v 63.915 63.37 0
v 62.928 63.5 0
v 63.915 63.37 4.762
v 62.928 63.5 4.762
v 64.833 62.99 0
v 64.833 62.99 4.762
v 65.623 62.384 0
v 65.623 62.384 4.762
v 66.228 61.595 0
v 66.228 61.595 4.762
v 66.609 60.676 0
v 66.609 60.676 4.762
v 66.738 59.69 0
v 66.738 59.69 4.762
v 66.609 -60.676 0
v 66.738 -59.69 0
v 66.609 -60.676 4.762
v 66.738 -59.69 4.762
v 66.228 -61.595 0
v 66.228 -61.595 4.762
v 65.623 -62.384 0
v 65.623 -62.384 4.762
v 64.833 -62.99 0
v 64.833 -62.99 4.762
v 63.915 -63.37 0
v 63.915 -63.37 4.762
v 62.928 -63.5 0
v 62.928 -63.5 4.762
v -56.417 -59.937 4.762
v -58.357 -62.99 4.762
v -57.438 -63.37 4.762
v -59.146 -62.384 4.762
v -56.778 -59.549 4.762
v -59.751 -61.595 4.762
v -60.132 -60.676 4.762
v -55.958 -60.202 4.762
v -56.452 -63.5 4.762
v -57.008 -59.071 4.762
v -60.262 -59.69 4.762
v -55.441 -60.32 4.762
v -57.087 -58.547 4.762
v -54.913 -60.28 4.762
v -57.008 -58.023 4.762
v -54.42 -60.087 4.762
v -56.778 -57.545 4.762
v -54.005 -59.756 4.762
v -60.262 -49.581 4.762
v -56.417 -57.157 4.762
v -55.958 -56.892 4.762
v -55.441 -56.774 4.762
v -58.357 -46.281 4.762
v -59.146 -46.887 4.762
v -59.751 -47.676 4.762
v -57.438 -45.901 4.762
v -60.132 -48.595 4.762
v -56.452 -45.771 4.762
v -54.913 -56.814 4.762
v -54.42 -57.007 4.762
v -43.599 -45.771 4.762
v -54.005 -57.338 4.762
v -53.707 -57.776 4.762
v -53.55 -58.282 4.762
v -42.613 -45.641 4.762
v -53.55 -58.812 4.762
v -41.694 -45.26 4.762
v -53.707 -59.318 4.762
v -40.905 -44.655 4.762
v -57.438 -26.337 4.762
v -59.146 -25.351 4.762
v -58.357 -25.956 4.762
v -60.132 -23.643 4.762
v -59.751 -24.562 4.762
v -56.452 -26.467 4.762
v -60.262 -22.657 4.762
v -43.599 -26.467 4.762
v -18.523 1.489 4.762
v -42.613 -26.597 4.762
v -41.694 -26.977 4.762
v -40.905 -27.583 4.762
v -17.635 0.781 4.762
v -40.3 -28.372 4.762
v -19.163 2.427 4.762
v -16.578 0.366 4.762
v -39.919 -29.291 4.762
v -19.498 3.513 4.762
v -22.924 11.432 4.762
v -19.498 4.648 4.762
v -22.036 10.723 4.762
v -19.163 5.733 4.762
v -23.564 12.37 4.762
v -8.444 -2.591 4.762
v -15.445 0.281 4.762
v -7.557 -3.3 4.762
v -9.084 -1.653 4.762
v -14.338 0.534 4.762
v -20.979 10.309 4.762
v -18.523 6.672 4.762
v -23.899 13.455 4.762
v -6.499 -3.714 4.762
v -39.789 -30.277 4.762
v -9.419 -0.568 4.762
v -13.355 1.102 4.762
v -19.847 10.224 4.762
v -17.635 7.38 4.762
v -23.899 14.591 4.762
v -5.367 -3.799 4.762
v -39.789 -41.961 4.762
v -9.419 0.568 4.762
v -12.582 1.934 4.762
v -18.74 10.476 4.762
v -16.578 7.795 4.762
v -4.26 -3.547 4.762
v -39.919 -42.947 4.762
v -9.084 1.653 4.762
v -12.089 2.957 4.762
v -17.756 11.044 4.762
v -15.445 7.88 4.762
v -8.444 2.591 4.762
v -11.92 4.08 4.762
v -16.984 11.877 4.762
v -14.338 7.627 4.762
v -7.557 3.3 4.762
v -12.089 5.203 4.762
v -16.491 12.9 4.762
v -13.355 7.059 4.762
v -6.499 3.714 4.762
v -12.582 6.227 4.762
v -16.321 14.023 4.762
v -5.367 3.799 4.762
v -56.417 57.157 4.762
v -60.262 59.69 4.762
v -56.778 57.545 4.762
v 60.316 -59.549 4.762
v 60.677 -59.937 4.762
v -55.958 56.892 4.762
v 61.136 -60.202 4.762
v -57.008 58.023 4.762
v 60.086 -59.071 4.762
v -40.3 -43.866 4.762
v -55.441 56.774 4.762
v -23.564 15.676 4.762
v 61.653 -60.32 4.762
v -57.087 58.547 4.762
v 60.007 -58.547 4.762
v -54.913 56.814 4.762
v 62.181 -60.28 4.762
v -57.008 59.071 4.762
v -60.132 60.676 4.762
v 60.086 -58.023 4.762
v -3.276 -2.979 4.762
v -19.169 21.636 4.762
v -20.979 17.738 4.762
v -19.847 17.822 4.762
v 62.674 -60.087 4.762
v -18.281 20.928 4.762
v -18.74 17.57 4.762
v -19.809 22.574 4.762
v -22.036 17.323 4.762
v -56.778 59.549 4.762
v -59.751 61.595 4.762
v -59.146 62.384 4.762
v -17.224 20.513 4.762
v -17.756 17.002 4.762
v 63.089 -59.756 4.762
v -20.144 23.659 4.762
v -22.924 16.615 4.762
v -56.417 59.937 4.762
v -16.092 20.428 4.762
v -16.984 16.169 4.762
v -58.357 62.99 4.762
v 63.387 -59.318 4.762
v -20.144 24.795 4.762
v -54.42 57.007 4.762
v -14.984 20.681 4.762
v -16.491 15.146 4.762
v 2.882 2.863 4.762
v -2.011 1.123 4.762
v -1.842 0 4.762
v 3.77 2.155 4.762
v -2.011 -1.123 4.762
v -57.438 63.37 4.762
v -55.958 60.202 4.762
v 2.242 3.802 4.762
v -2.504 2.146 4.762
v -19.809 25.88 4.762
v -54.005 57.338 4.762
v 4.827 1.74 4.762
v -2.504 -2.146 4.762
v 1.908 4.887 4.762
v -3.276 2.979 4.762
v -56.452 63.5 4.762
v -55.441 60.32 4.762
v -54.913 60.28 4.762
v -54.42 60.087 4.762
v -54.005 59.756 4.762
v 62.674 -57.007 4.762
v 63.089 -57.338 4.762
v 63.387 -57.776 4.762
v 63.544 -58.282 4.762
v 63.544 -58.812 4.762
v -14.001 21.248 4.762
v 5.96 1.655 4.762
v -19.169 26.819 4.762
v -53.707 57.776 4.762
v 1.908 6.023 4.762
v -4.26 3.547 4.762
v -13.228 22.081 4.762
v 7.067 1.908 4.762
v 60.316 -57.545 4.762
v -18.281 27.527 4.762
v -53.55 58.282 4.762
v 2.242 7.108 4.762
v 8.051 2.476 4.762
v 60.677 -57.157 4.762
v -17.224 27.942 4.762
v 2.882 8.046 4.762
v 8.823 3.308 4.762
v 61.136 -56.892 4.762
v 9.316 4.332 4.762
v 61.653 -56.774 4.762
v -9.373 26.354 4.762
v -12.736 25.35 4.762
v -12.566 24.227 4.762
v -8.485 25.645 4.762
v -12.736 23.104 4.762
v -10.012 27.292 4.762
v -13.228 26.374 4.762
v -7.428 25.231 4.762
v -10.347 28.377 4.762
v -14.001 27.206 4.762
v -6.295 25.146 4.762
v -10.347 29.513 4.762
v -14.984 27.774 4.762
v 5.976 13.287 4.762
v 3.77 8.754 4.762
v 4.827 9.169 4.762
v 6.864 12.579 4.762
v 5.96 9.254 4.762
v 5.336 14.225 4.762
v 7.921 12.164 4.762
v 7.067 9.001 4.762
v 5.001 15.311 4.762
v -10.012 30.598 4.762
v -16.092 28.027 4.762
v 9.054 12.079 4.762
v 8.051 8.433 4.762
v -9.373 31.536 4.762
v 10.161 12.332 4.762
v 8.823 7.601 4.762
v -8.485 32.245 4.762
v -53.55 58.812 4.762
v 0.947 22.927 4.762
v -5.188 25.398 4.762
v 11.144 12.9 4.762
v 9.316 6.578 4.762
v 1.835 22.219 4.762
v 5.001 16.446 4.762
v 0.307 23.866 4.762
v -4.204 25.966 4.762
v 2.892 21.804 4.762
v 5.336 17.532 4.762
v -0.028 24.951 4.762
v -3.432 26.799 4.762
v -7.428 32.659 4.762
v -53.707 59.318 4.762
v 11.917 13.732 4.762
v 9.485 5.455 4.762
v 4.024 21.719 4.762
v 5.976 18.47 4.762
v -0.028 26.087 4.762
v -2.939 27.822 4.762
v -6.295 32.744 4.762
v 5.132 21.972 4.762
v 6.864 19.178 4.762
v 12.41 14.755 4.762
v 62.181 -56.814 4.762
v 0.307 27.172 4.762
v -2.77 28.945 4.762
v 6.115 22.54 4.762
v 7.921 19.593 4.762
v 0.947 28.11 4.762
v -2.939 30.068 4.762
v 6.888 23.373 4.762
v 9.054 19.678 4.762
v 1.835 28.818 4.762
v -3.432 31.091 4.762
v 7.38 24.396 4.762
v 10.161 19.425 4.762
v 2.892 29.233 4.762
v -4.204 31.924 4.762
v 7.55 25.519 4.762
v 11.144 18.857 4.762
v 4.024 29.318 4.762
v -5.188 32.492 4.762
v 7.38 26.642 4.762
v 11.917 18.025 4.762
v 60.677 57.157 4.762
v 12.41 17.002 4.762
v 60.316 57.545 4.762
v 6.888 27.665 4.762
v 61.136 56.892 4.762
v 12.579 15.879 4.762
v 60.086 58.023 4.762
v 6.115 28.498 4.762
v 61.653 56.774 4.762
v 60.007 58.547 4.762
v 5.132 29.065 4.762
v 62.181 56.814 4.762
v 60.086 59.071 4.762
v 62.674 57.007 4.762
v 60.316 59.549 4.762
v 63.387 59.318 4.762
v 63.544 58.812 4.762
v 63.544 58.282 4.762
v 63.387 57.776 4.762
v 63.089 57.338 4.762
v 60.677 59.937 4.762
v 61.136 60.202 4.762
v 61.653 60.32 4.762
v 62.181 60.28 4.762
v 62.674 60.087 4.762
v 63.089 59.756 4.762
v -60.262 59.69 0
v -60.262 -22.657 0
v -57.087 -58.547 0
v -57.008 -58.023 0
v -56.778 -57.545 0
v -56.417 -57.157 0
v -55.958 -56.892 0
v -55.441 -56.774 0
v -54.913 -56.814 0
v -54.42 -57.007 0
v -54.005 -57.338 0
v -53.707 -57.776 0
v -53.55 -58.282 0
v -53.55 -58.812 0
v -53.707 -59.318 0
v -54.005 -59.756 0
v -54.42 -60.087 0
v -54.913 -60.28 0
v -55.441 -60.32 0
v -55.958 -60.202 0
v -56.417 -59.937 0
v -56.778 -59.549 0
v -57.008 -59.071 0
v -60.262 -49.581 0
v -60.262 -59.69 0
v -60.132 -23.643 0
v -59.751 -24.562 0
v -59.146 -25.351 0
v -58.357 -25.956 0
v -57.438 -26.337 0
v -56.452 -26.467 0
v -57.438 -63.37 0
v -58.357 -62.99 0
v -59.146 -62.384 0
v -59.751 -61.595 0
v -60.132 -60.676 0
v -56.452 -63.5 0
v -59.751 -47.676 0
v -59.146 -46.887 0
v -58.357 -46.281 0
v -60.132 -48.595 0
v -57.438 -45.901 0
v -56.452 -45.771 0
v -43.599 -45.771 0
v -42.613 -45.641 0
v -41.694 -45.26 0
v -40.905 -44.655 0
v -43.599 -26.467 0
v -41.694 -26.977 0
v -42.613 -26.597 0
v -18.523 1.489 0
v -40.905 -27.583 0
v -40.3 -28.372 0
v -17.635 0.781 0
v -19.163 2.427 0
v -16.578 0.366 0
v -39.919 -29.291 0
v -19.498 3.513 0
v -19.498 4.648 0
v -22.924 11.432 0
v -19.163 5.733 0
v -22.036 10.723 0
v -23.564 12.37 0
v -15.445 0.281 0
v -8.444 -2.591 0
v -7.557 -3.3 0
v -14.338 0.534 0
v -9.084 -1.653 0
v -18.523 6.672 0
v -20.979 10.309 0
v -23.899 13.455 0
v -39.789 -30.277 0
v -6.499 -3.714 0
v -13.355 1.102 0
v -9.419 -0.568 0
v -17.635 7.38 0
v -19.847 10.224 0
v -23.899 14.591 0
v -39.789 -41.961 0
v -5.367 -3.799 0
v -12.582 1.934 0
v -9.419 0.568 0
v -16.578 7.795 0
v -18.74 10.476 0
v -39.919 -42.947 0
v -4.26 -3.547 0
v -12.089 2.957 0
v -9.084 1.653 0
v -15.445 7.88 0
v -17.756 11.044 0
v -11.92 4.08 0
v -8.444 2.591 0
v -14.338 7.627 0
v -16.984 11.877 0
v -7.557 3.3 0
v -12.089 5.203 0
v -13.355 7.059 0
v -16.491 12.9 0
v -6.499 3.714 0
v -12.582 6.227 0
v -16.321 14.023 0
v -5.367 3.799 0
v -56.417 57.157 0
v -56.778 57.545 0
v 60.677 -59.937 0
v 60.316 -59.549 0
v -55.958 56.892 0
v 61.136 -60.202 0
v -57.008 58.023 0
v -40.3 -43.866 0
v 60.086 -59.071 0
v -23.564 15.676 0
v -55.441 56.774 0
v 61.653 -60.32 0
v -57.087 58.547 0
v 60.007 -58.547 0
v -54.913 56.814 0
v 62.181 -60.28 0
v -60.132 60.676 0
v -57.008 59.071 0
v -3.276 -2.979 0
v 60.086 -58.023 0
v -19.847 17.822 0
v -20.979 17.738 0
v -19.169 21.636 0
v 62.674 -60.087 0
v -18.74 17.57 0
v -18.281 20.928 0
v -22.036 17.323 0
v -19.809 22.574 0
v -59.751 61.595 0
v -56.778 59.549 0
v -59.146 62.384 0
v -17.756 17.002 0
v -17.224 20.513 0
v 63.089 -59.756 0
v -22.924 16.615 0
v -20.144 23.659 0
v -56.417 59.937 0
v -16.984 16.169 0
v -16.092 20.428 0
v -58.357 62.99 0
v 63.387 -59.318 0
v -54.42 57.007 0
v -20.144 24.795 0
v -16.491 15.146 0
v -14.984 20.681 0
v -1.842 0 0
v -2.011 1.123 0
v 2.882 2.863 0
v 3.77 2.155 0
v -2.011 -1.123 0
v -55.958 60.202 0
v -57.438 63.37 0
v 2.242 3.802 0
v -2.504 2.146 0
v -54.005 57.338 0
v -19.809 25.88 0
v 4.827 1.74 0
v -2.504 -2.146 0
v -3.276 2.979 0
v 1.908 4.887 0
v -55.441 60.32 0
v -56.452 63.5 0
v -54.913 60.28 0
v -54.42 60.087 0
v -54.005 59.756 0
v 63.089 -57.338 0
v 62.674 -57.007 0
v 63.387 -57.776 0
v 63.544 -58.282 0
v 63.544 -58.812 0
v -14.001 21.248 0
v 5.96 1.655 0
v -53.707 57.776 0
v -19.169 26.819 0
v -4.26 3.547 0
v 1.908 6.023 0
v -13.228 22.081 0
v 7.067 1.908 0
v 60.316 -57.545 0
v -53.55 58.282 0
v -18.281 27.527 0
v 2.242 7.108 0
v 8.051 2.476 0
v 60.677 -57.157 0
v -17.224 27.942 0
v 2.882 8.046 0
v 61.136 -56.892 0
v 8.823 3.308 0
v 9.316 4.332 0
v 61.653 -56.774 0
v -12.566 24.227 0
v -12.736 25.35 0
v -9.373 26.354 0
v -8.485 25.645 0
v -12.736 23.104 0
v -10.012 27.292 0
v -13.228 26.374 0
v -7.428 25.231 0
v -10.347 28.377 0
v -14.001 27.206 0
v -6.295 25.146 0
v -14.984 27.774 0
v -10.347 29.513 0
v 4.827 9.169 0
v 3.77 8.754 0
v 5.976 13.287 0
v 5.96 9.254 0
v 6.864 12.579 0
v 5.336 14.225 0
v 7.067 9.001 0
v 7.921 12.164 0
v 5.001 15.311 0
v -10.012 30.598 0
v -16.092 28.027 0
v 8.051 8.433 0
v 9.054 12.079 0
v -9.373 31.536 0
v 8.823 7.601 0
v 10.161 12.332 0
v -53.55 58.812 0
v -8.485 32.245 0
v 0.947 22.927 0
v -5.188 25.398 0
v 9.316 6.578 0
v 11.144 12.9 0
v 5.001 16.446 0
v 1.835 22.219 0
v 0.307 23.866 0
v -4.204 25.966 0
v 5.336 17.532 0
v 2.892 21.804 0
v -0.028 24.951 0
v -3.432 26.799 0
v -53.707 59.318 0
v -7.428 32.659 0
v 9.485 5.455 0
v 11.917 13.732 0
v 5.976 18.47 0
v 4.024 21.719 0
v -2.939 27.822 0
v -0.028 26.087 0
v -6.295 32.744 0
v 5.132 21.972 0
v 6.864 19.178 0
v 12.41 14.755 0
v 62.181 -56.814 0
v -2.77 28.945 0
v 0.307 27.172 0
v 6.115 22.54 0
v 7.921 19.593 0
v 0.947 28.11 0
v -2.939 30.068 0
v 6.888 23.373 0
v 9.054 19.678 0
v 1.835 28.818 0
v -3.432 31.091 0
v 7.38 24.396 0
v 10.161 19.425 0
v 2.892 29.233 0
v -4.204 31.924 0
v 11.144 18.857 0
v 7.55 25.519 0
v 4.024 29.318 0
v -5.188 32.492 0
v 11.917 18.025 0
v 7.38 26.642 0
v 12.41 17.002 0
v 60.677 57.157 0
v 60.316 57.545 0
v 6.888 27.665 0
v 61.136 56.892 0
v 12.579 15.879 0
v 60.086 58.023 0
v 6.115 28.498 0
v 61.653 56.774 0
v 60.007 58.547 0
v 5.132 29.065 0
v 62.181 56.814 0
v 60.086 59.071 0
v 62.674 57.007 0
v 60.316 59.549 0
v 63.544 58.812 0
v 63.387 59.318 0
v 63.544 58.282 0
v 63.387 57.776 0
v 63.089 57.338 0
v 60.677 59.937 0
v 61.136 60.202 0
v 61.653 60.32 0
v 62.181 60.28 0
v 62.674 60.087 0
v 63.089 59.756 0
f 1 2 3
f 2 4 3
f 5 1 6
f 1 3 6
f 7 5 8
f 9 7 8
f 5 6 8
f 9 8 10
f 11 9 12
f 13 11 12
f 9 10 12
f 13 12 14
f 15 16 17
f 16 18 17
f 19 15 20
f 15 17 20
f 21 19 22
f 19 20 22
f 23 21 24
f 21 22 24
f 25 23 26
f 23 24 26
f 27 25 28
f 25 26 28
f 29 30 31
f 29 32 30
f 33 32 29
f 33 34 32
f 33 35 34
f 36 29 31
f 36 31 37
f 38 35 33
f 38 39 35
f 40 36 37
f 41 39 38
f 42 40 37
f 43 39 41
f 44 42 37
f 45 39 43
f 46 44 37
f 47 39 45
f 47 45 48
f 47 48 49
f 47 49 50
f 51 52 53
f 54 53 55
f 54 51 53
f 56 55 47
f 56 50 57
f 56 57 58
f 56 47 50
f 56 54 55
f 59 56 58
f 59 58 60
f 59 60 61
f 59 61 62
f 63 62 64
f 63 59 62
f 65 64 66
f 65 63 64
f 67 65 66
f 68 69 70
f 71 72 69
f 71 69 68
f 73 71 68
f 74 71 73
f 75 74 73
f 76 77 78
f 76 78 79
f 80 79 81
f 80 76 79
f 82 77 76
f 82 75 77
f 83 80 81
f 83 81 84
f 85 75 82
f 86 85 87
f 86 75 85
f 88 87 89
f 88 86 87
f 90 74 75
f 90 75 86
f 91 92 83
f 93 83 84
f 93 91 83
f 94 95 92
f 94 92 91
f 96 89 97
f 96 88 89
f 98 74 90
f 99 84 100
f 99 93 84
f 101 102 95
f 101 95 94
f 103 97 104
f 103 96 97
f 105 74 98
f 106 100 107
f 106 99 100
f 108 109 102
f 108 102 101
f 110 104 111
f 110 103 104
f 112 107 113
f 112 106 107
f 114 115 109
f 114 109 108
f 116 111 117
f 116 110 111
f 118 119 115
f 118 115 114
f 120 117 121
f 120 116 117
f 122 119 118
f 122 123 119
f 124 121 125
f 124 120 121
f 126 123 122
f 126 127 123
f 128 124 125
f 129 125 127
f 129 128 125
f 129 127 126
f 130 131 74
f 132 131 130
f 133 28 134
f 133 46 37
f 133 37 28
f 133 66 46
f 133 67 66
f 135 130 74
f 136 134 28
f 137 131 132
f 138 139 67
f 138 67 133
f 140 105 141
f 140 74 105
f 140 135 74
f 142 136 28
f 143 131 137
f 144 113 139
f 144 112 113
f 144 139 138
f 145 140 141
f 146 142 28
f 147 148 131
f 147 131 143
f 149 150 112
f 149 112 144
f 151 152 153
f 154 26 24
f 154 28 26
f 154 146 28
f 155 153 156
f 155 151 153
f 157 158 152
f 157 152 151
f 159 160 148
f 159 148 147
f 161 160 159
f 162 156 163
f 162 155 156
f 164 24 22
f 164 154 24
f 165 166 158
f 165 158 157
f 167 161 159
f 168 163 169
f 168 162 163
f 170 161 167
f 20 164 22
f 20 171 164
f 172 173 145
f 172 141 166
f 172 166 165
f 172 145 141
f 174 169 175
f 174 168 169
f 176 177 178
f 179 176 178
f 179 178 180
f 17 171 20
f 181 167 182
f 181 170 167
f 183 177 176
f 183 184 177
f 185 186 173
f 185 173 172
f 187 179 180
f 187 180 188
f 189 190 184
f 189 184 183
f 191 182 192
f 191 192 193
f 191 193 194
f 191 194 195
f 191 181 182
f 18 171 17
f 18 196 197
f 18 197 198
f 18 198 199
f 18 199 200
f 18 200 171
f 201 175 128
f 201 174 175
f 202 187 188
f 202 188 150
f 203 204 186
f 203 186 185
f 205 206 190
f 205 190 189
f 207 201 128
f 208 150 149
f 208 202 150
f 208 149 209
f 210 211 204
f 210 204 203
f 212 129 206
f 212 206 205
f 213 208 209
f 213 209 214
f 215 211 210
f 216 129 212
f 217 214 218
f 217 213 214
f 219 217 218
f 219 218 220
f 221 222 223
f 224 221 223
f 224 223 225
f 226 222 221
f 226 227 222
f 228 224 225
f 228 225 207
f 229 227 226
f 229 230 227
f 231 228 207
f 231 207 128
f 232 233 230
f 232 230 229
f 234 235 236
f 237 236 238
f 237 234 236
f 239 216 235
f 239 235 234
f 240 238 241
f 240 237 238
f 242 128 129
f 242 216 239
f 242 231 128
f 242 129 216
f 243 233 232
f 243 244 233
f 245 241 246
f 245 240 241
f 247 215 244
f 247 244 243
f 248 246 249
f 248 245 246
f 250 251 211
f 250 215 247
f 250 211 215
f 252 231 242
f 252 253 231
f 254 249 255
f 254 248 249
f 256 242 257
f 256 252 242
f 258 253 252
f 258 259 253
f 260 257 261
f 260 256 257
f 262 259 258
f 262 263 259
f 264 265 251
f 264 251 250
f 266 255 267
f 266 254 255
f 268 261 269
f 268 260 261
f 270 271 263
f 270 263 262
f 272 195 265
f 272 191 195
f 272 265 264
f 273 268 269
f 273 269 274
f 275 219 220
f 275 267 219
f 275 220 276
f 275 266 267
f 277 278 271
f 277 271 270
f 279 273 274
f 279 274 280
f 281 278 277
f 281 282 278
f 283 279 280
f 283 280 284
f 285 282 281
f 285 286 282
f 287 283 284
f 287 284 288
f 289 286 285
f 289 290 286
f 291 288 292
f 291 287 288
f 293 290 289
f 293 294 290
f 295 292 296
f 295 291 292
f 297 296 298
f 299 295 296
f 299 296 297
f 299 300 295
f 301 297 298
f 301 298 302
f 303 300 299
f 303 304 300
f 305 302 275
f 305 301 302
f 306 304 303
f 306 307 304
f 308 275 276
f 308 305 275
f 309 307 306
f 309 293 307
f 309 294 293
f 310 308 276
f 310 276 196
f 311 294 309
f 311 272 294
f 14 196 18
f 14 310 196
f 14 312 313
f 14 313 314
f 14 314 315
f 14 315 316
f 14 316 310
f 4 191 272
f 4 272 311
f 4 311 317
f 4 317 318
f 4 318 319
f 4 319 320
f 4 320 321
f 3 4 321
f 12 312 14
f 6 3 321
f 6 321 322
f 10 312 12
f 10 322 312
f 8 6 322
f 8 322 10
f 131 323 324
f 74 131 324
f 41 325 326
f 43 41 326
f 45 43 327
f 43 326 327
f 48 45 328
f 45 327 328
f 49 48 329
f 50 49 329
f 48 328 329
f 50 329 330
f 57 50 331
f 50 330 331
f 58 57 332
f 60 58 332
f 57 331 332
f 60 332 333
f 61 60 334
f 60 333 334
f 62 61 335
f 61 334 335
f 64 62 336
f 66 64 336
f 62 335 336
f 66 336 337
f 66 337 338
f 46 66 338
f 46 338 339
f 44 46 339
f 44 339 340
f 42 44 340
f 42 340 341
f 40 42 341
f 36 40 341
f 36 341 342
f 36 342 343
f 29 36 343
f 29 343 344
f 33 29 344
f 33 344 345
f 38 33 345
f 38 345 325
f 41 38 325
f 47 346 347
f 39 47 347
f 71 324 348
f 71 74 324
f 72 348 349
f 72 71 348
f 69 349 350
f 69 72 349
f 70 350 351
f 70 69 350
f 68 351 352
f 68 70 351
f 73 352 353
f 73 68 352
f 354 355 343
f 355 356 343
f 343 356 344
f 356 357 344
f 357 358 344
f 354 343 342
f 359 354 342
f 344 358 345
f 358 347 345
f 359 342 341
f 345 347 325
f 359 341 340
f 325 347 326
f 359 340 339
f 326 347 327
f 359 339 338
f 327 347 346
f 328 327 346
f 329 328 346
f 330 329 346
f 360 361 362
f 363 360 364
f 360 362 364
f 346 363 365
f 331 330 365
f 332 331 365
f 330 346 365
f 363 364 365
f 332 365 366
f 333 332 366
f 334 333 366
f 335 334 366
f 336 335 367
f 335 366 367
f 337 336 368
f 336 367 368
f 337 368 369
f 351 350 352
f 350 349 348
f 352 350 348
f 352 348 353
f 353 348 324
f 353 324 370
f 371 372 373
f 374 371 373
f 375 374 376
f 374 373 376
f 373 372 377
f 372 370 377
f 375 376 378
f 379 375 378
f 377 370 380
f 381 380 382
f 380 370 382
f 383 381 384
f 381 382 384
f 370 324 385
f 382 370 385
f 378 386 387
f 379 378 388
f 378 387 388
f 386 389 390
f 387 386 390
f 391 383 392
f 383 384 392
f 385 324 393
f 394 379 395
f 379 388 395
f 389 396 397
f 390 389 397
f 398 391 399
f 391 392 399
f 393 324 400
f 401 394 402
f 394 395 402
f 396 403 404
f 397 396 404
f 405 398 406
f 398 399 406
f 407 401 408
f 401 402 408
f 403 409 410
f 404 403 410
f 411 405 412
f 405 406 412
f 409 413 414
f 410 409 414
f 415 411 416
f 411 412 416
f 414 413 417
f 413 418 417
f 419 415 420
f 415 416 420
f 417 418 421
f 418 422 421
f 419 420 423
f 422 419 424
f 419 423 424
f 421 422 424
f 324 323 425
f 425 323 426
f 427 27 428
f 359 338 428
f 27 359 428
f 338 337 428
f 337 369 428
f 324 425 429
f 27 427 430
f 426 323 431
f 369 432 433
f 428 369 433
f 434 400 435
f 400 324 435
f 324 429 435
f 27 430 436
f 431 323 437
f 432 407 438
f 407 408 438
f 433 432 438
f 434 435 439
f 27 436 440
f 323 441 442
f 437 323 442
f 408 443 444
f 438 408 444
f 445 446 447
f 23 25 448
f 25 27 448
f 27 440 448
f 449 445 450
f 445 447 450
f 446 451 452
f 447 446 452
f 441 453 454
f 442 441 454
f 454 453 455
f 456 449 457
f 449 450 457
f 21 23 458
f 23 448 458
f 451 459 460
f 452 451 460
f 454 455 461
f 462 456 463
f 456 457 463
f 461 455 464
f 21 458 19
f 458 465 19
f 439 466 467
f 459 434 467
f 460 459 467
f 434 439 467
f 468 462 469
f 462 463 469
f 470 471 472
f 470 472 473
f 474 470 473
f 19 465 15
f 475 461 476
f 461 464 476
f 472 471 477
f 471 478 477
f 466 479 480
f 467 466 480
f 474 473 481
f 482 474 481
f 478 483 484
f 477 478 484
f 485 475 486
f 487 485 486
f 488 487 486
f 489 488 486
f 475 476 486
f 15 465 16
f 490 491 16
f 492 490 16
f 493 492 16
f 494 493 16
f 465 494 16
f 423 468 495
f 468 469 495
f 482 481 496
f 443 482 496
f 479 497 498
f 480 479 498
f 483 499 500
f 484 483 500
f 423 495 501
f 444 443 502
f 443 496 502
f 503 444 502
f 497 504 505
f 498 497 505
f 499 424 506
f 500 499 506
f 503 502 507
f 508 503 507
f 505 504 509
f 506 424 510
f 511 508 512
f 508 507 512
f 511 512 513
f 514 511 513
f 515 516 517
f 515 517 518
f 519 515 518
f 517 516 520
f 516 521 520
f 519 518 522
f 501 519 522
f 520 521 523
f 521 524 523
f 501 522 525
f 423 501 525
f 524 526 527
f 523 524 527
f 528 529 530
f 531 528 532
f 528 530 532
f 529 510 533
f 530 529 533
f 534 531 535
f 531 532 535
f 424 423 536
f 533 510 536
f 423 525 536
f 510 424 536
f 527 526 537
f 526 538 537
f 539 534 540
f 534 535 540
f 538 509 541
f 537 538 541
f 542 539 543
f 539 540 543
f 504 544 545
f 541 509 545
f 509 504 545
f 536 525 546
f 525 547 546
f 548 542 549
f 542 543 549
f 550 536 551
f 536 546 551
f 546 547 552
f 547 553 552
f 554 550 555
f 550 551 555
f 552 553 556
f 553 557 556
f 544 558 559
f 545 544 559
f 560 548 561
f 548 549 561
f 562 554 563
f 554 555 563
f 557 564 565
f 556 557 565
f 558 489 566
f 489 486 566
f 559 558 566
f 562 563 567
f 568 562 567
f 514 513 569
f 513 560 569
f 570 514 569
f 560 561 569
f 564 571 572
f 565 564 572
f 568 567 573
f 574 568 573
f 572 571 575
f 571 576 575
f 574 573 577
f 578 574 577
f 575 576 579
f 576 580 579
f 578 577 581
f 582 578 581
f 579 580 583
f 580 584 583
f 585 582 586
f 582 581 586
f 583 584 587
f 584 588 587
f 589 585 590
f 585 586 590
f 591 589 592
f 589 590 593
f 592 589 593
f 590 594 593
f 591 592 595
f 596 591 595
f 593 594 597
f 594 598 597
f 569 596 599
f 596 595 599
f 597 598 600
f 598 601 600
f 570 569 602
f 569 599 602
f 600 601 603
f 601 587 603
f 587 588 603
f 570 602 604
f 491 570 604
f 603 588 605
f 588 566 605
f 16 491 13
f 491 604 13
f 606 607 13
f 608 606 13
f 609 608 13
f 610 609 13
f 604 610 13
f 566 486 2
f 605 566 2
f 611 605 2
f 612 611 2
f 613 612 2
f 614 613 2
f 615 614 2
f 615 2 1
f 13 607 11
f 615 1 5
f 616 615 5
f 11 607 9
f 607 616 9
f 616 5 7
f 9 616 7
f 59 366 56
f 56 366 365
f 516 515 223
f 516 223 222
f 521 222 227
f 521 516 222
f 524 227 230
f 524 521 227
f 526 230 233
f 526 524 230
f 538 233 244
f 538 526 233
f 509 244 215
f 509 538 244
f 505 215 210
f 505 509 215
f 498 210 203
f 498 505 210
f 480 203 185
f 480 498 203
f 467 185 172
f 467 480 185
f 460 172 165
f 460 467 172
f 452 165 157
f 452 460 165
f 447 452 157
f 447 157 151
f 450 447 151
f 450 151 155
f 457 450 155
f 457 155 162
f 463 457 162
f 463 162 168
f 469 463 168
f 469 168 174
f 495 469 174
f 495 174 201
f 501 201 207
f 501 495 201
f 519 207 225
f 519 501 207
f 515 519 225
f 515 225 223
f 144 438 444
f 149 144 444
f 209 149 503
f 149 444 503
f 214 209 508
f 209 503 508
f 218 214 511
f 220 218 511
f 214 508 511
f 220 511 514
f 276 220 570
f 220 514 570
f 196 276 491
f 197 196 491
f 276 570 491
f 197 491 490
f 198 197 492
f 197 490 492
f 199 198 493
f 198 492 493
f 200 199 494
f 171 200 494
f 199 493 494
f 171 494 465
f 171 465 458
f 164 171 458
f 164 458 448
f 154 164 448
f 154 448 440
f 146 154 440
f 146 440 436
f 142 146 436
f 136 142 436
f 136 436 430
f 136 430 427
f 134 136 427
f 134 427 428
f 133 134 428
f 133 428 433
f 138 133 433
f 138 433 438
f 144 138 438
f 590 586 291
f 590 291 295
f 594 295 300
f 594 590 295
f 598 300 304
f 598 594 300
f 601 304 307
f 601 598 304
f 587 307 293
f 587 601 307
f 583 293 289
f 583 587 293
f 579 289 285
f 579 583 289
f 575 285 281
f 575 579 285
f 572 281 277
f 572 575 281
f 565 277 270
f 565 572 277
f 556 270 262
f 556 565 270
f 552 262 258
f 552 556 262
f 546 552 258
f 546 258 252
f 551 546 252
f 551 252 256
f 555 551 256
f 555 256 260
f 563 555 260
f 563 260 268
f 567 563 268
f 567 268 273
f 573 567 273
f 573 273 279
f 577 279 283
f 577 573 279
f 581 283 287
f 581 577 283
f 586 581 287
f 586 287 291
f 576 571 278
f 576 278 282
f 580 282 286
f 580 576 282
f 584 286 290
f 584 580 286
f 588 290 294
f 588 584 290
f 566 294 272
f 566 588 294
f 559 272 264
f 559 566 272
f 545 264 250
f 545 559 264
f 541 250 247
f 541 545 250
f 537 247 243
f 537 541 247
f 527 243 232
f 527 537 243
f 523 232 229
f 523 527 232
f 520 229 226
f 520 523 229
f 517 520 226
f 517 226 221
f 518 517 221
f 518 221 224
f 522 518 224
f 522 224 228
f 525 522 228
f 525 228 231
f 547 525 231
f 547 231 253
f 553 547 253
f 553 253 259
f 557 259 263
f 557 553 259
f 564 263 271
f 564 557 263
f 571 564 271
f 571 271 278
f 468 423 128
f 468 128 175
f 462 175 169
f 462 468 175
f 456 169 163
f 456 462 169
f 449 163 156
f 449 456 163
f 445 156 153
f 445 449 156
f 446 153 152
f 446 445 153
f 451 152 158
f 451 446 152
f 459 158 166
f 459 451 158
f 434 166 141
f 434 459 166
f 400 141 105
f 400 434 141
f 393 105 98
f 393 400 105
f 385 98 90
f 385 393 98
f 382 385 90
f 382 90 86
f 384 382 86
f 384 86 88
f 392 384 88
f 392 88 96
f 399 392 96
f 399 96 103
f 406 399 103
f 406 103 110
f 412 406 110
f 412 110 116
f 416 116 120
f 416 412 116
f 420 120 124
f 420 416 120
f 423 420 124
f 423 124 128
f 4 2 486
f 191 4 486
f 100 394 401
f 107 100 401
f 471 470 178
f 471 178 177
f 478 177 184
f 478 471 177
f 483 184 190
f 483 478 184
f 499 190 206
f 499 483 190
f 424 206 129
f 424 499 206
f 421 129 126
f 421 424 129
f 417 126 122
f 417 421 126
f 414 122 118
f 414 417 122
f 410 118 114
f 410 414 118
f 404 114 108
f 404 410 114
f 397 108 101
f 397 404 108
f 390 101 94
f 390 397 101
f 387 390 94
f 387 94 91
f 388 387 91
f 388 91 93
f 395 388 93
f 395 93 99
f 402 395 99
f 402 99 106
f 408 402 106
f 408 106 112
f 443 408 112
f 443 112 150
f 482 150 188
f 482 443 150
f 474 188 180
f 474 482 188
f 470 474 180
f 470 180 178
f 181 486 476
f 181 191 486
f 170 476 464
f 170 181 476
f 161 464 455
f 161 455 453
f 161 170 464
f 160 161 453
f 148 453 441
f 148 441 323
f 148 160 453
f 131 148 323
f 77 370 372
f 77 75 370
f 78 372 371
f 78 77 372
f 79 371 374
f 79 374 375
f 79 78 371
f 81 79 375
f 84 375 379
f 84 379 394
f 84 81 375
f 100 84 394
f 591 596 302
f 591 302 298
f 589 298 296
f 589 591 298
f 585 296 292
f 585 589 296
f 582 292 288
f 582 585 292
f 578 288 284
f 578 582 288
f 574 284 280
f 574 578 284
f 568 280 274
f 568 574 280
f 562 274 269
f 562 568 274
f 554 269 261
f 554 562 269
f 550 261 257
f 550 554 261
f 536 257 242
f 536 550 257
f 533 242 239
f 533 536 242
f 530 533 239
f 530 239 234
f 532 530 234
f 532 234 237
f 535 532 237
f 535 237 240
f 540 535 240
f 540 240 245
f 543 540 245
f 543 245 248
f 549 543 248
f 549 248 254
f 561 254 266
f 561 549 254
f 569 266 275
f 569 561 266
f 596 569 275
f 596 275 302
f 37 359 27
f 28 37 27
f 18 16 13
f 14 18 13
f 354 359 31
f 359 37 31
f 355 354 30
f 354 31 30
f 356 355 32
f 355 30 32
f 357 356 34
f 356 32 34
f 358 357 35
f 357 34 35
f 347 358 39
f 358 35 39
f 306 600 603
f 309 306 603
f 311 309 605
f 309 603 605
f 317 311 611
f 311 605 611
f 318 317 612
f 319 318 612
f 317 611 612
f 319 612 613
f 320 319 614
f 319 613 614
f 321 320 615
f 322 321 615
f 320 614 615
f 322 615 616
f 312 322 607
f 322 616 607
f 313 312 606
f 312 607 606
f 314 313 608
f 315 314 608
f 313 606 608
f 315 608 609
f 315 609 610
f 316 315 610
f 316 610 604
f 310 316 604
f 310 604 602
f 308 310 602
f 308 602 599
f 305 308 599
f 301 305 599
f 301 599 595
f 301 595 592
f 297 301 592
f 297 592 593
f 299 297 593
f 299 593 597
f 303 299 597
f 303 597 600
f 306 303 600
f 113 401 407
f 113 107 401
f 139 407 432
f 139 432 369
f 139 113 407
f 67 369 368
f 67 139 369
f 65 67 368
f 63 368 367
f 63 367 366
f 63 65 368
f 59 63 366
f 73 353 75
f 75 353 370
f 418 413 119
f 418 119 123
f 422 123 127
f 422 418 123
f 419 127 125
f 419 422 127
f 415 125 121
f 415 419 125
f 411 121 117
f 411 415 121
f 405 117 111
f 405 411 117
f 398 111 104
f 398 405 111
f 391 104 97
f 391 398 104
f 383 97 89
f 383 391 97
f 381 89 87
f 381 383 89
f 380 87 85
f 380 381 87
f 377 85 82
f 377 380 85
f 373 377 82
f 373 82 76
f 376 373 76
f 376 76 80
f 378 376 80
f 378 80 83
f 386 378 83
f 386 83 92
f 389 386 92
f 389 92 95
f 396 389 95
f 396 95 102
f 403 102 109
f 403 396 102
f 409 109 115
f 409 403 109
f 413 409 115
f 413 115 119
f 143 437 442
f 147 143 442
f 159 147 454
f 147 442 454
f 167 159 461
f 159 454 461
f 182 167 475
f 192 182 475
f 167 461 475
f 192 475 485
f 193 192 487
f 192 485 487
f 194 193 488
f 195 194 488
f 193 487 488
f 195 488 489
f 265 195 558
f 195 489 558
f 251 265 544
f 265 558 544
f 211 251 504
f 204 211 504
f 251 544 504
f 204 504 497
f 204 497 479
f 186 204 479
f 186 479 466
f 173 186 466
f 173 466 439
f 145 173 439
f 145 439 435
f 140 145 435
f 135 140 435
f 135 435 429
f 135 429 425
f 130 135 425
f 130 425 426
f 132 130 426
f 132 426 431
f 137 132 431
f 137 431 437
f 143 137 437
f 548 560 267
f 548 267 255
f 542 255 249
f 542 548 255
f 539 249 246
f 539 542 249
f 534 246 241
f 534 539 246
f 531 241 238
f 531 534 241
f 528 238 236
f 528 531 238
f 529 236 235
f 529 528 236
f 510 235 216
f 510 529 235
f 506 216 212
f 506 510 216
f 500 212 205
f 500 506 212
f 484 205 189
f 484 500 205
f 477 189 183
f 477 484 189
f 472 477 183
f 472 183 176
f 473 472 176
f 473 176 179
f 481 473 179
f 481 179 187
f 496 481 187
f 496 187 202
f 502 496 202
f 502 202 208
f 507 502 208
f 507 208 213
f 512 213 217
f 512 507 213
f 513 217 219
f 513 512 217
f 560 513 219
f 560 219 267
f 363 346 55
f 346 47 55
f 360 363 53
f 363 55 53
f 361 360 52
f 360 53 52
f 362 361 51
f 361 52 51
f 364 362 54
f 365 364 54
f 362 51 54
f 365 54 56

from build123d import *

# Parameters (mm, degrees)
F0_R     = 3.81
F1_DEPTH = 4.7625
F3_D     = 3.556
F4_R     = 3.81


with BuildPart() as f1:
    # F0 (on Top) → F1 (new body)
    with BuildSketch(Plane.XY):
        Polygon((66.738463, 63.5), (-60.261537, 63.5), (-60.261537, -26.4668), (-39.789137, -26.4668), (-39.789137, -45.7708), (-60.261537, -45.7708), (-60.261537, -63.5), (66.738463, -63.5), align=None)
        with Locations((-15.730162, 4.080383)):
            Circle(F0_R, mode=Mode.SUBTRACT)
        with Locations((-20.131484, 14.023047)):
            Circle(F0_R, mode=Mode.SUBTRACT)
        with Locations((-5.651537, 0)):
            Circle(F0_R, mode=Mode.SUBTRACT)
        with Locations((-16.376234, 24.227276)):
            Circle(F0_R, mode=Mode.SUBTRACT)
        with Locations((-6.579748, 28.945015)):
            Circle(F0_R, mode=Mode.SUBTRACT)
        with Locations((5.675161, 5.45465)):
            Circle(F0_R, mode=Mode.SUBTRACT)
        with Locations((8.768908, 15.878513)):
            Circle(F0_R, mode=Mode.SUBTRACT)
        with Locations((3.739601, 25.518755)):
            Circle(F0_R, mode=Mode.SUBTRACT)
    extrude(amount=F1_DEPTH)

    # F3 (through all)
    with Locations(Plane.XY.offset(4.7625)):
        with Locations((-55.308537, 58.547), (61.785463, 58.547), (-55.308537, -58.547), (61.785463, -58.547)):
            Hole(F3_D / 2)

    # F4
    f4_edges = [f1.edges().sort_by_distance(p)[0] for p in [
        (-60.261537, 63.5, 2.38125),
        (-60.261537, -63.5, 2.38125),
        (66.738463, -63.5, 2.38125),
        (66.738463, 63.5, 2.38125),
        (-60.261537, -26.4668, 2.38125),
        (-60.261537, -45.7708, 2.38125),
        (-39.789137, -26.4668, 2.38125),
        (-39.789137, -45.7708, 2.38125),
    ]]
    fillet(f4_edges, radius=F4_R)


solid = f1.part
